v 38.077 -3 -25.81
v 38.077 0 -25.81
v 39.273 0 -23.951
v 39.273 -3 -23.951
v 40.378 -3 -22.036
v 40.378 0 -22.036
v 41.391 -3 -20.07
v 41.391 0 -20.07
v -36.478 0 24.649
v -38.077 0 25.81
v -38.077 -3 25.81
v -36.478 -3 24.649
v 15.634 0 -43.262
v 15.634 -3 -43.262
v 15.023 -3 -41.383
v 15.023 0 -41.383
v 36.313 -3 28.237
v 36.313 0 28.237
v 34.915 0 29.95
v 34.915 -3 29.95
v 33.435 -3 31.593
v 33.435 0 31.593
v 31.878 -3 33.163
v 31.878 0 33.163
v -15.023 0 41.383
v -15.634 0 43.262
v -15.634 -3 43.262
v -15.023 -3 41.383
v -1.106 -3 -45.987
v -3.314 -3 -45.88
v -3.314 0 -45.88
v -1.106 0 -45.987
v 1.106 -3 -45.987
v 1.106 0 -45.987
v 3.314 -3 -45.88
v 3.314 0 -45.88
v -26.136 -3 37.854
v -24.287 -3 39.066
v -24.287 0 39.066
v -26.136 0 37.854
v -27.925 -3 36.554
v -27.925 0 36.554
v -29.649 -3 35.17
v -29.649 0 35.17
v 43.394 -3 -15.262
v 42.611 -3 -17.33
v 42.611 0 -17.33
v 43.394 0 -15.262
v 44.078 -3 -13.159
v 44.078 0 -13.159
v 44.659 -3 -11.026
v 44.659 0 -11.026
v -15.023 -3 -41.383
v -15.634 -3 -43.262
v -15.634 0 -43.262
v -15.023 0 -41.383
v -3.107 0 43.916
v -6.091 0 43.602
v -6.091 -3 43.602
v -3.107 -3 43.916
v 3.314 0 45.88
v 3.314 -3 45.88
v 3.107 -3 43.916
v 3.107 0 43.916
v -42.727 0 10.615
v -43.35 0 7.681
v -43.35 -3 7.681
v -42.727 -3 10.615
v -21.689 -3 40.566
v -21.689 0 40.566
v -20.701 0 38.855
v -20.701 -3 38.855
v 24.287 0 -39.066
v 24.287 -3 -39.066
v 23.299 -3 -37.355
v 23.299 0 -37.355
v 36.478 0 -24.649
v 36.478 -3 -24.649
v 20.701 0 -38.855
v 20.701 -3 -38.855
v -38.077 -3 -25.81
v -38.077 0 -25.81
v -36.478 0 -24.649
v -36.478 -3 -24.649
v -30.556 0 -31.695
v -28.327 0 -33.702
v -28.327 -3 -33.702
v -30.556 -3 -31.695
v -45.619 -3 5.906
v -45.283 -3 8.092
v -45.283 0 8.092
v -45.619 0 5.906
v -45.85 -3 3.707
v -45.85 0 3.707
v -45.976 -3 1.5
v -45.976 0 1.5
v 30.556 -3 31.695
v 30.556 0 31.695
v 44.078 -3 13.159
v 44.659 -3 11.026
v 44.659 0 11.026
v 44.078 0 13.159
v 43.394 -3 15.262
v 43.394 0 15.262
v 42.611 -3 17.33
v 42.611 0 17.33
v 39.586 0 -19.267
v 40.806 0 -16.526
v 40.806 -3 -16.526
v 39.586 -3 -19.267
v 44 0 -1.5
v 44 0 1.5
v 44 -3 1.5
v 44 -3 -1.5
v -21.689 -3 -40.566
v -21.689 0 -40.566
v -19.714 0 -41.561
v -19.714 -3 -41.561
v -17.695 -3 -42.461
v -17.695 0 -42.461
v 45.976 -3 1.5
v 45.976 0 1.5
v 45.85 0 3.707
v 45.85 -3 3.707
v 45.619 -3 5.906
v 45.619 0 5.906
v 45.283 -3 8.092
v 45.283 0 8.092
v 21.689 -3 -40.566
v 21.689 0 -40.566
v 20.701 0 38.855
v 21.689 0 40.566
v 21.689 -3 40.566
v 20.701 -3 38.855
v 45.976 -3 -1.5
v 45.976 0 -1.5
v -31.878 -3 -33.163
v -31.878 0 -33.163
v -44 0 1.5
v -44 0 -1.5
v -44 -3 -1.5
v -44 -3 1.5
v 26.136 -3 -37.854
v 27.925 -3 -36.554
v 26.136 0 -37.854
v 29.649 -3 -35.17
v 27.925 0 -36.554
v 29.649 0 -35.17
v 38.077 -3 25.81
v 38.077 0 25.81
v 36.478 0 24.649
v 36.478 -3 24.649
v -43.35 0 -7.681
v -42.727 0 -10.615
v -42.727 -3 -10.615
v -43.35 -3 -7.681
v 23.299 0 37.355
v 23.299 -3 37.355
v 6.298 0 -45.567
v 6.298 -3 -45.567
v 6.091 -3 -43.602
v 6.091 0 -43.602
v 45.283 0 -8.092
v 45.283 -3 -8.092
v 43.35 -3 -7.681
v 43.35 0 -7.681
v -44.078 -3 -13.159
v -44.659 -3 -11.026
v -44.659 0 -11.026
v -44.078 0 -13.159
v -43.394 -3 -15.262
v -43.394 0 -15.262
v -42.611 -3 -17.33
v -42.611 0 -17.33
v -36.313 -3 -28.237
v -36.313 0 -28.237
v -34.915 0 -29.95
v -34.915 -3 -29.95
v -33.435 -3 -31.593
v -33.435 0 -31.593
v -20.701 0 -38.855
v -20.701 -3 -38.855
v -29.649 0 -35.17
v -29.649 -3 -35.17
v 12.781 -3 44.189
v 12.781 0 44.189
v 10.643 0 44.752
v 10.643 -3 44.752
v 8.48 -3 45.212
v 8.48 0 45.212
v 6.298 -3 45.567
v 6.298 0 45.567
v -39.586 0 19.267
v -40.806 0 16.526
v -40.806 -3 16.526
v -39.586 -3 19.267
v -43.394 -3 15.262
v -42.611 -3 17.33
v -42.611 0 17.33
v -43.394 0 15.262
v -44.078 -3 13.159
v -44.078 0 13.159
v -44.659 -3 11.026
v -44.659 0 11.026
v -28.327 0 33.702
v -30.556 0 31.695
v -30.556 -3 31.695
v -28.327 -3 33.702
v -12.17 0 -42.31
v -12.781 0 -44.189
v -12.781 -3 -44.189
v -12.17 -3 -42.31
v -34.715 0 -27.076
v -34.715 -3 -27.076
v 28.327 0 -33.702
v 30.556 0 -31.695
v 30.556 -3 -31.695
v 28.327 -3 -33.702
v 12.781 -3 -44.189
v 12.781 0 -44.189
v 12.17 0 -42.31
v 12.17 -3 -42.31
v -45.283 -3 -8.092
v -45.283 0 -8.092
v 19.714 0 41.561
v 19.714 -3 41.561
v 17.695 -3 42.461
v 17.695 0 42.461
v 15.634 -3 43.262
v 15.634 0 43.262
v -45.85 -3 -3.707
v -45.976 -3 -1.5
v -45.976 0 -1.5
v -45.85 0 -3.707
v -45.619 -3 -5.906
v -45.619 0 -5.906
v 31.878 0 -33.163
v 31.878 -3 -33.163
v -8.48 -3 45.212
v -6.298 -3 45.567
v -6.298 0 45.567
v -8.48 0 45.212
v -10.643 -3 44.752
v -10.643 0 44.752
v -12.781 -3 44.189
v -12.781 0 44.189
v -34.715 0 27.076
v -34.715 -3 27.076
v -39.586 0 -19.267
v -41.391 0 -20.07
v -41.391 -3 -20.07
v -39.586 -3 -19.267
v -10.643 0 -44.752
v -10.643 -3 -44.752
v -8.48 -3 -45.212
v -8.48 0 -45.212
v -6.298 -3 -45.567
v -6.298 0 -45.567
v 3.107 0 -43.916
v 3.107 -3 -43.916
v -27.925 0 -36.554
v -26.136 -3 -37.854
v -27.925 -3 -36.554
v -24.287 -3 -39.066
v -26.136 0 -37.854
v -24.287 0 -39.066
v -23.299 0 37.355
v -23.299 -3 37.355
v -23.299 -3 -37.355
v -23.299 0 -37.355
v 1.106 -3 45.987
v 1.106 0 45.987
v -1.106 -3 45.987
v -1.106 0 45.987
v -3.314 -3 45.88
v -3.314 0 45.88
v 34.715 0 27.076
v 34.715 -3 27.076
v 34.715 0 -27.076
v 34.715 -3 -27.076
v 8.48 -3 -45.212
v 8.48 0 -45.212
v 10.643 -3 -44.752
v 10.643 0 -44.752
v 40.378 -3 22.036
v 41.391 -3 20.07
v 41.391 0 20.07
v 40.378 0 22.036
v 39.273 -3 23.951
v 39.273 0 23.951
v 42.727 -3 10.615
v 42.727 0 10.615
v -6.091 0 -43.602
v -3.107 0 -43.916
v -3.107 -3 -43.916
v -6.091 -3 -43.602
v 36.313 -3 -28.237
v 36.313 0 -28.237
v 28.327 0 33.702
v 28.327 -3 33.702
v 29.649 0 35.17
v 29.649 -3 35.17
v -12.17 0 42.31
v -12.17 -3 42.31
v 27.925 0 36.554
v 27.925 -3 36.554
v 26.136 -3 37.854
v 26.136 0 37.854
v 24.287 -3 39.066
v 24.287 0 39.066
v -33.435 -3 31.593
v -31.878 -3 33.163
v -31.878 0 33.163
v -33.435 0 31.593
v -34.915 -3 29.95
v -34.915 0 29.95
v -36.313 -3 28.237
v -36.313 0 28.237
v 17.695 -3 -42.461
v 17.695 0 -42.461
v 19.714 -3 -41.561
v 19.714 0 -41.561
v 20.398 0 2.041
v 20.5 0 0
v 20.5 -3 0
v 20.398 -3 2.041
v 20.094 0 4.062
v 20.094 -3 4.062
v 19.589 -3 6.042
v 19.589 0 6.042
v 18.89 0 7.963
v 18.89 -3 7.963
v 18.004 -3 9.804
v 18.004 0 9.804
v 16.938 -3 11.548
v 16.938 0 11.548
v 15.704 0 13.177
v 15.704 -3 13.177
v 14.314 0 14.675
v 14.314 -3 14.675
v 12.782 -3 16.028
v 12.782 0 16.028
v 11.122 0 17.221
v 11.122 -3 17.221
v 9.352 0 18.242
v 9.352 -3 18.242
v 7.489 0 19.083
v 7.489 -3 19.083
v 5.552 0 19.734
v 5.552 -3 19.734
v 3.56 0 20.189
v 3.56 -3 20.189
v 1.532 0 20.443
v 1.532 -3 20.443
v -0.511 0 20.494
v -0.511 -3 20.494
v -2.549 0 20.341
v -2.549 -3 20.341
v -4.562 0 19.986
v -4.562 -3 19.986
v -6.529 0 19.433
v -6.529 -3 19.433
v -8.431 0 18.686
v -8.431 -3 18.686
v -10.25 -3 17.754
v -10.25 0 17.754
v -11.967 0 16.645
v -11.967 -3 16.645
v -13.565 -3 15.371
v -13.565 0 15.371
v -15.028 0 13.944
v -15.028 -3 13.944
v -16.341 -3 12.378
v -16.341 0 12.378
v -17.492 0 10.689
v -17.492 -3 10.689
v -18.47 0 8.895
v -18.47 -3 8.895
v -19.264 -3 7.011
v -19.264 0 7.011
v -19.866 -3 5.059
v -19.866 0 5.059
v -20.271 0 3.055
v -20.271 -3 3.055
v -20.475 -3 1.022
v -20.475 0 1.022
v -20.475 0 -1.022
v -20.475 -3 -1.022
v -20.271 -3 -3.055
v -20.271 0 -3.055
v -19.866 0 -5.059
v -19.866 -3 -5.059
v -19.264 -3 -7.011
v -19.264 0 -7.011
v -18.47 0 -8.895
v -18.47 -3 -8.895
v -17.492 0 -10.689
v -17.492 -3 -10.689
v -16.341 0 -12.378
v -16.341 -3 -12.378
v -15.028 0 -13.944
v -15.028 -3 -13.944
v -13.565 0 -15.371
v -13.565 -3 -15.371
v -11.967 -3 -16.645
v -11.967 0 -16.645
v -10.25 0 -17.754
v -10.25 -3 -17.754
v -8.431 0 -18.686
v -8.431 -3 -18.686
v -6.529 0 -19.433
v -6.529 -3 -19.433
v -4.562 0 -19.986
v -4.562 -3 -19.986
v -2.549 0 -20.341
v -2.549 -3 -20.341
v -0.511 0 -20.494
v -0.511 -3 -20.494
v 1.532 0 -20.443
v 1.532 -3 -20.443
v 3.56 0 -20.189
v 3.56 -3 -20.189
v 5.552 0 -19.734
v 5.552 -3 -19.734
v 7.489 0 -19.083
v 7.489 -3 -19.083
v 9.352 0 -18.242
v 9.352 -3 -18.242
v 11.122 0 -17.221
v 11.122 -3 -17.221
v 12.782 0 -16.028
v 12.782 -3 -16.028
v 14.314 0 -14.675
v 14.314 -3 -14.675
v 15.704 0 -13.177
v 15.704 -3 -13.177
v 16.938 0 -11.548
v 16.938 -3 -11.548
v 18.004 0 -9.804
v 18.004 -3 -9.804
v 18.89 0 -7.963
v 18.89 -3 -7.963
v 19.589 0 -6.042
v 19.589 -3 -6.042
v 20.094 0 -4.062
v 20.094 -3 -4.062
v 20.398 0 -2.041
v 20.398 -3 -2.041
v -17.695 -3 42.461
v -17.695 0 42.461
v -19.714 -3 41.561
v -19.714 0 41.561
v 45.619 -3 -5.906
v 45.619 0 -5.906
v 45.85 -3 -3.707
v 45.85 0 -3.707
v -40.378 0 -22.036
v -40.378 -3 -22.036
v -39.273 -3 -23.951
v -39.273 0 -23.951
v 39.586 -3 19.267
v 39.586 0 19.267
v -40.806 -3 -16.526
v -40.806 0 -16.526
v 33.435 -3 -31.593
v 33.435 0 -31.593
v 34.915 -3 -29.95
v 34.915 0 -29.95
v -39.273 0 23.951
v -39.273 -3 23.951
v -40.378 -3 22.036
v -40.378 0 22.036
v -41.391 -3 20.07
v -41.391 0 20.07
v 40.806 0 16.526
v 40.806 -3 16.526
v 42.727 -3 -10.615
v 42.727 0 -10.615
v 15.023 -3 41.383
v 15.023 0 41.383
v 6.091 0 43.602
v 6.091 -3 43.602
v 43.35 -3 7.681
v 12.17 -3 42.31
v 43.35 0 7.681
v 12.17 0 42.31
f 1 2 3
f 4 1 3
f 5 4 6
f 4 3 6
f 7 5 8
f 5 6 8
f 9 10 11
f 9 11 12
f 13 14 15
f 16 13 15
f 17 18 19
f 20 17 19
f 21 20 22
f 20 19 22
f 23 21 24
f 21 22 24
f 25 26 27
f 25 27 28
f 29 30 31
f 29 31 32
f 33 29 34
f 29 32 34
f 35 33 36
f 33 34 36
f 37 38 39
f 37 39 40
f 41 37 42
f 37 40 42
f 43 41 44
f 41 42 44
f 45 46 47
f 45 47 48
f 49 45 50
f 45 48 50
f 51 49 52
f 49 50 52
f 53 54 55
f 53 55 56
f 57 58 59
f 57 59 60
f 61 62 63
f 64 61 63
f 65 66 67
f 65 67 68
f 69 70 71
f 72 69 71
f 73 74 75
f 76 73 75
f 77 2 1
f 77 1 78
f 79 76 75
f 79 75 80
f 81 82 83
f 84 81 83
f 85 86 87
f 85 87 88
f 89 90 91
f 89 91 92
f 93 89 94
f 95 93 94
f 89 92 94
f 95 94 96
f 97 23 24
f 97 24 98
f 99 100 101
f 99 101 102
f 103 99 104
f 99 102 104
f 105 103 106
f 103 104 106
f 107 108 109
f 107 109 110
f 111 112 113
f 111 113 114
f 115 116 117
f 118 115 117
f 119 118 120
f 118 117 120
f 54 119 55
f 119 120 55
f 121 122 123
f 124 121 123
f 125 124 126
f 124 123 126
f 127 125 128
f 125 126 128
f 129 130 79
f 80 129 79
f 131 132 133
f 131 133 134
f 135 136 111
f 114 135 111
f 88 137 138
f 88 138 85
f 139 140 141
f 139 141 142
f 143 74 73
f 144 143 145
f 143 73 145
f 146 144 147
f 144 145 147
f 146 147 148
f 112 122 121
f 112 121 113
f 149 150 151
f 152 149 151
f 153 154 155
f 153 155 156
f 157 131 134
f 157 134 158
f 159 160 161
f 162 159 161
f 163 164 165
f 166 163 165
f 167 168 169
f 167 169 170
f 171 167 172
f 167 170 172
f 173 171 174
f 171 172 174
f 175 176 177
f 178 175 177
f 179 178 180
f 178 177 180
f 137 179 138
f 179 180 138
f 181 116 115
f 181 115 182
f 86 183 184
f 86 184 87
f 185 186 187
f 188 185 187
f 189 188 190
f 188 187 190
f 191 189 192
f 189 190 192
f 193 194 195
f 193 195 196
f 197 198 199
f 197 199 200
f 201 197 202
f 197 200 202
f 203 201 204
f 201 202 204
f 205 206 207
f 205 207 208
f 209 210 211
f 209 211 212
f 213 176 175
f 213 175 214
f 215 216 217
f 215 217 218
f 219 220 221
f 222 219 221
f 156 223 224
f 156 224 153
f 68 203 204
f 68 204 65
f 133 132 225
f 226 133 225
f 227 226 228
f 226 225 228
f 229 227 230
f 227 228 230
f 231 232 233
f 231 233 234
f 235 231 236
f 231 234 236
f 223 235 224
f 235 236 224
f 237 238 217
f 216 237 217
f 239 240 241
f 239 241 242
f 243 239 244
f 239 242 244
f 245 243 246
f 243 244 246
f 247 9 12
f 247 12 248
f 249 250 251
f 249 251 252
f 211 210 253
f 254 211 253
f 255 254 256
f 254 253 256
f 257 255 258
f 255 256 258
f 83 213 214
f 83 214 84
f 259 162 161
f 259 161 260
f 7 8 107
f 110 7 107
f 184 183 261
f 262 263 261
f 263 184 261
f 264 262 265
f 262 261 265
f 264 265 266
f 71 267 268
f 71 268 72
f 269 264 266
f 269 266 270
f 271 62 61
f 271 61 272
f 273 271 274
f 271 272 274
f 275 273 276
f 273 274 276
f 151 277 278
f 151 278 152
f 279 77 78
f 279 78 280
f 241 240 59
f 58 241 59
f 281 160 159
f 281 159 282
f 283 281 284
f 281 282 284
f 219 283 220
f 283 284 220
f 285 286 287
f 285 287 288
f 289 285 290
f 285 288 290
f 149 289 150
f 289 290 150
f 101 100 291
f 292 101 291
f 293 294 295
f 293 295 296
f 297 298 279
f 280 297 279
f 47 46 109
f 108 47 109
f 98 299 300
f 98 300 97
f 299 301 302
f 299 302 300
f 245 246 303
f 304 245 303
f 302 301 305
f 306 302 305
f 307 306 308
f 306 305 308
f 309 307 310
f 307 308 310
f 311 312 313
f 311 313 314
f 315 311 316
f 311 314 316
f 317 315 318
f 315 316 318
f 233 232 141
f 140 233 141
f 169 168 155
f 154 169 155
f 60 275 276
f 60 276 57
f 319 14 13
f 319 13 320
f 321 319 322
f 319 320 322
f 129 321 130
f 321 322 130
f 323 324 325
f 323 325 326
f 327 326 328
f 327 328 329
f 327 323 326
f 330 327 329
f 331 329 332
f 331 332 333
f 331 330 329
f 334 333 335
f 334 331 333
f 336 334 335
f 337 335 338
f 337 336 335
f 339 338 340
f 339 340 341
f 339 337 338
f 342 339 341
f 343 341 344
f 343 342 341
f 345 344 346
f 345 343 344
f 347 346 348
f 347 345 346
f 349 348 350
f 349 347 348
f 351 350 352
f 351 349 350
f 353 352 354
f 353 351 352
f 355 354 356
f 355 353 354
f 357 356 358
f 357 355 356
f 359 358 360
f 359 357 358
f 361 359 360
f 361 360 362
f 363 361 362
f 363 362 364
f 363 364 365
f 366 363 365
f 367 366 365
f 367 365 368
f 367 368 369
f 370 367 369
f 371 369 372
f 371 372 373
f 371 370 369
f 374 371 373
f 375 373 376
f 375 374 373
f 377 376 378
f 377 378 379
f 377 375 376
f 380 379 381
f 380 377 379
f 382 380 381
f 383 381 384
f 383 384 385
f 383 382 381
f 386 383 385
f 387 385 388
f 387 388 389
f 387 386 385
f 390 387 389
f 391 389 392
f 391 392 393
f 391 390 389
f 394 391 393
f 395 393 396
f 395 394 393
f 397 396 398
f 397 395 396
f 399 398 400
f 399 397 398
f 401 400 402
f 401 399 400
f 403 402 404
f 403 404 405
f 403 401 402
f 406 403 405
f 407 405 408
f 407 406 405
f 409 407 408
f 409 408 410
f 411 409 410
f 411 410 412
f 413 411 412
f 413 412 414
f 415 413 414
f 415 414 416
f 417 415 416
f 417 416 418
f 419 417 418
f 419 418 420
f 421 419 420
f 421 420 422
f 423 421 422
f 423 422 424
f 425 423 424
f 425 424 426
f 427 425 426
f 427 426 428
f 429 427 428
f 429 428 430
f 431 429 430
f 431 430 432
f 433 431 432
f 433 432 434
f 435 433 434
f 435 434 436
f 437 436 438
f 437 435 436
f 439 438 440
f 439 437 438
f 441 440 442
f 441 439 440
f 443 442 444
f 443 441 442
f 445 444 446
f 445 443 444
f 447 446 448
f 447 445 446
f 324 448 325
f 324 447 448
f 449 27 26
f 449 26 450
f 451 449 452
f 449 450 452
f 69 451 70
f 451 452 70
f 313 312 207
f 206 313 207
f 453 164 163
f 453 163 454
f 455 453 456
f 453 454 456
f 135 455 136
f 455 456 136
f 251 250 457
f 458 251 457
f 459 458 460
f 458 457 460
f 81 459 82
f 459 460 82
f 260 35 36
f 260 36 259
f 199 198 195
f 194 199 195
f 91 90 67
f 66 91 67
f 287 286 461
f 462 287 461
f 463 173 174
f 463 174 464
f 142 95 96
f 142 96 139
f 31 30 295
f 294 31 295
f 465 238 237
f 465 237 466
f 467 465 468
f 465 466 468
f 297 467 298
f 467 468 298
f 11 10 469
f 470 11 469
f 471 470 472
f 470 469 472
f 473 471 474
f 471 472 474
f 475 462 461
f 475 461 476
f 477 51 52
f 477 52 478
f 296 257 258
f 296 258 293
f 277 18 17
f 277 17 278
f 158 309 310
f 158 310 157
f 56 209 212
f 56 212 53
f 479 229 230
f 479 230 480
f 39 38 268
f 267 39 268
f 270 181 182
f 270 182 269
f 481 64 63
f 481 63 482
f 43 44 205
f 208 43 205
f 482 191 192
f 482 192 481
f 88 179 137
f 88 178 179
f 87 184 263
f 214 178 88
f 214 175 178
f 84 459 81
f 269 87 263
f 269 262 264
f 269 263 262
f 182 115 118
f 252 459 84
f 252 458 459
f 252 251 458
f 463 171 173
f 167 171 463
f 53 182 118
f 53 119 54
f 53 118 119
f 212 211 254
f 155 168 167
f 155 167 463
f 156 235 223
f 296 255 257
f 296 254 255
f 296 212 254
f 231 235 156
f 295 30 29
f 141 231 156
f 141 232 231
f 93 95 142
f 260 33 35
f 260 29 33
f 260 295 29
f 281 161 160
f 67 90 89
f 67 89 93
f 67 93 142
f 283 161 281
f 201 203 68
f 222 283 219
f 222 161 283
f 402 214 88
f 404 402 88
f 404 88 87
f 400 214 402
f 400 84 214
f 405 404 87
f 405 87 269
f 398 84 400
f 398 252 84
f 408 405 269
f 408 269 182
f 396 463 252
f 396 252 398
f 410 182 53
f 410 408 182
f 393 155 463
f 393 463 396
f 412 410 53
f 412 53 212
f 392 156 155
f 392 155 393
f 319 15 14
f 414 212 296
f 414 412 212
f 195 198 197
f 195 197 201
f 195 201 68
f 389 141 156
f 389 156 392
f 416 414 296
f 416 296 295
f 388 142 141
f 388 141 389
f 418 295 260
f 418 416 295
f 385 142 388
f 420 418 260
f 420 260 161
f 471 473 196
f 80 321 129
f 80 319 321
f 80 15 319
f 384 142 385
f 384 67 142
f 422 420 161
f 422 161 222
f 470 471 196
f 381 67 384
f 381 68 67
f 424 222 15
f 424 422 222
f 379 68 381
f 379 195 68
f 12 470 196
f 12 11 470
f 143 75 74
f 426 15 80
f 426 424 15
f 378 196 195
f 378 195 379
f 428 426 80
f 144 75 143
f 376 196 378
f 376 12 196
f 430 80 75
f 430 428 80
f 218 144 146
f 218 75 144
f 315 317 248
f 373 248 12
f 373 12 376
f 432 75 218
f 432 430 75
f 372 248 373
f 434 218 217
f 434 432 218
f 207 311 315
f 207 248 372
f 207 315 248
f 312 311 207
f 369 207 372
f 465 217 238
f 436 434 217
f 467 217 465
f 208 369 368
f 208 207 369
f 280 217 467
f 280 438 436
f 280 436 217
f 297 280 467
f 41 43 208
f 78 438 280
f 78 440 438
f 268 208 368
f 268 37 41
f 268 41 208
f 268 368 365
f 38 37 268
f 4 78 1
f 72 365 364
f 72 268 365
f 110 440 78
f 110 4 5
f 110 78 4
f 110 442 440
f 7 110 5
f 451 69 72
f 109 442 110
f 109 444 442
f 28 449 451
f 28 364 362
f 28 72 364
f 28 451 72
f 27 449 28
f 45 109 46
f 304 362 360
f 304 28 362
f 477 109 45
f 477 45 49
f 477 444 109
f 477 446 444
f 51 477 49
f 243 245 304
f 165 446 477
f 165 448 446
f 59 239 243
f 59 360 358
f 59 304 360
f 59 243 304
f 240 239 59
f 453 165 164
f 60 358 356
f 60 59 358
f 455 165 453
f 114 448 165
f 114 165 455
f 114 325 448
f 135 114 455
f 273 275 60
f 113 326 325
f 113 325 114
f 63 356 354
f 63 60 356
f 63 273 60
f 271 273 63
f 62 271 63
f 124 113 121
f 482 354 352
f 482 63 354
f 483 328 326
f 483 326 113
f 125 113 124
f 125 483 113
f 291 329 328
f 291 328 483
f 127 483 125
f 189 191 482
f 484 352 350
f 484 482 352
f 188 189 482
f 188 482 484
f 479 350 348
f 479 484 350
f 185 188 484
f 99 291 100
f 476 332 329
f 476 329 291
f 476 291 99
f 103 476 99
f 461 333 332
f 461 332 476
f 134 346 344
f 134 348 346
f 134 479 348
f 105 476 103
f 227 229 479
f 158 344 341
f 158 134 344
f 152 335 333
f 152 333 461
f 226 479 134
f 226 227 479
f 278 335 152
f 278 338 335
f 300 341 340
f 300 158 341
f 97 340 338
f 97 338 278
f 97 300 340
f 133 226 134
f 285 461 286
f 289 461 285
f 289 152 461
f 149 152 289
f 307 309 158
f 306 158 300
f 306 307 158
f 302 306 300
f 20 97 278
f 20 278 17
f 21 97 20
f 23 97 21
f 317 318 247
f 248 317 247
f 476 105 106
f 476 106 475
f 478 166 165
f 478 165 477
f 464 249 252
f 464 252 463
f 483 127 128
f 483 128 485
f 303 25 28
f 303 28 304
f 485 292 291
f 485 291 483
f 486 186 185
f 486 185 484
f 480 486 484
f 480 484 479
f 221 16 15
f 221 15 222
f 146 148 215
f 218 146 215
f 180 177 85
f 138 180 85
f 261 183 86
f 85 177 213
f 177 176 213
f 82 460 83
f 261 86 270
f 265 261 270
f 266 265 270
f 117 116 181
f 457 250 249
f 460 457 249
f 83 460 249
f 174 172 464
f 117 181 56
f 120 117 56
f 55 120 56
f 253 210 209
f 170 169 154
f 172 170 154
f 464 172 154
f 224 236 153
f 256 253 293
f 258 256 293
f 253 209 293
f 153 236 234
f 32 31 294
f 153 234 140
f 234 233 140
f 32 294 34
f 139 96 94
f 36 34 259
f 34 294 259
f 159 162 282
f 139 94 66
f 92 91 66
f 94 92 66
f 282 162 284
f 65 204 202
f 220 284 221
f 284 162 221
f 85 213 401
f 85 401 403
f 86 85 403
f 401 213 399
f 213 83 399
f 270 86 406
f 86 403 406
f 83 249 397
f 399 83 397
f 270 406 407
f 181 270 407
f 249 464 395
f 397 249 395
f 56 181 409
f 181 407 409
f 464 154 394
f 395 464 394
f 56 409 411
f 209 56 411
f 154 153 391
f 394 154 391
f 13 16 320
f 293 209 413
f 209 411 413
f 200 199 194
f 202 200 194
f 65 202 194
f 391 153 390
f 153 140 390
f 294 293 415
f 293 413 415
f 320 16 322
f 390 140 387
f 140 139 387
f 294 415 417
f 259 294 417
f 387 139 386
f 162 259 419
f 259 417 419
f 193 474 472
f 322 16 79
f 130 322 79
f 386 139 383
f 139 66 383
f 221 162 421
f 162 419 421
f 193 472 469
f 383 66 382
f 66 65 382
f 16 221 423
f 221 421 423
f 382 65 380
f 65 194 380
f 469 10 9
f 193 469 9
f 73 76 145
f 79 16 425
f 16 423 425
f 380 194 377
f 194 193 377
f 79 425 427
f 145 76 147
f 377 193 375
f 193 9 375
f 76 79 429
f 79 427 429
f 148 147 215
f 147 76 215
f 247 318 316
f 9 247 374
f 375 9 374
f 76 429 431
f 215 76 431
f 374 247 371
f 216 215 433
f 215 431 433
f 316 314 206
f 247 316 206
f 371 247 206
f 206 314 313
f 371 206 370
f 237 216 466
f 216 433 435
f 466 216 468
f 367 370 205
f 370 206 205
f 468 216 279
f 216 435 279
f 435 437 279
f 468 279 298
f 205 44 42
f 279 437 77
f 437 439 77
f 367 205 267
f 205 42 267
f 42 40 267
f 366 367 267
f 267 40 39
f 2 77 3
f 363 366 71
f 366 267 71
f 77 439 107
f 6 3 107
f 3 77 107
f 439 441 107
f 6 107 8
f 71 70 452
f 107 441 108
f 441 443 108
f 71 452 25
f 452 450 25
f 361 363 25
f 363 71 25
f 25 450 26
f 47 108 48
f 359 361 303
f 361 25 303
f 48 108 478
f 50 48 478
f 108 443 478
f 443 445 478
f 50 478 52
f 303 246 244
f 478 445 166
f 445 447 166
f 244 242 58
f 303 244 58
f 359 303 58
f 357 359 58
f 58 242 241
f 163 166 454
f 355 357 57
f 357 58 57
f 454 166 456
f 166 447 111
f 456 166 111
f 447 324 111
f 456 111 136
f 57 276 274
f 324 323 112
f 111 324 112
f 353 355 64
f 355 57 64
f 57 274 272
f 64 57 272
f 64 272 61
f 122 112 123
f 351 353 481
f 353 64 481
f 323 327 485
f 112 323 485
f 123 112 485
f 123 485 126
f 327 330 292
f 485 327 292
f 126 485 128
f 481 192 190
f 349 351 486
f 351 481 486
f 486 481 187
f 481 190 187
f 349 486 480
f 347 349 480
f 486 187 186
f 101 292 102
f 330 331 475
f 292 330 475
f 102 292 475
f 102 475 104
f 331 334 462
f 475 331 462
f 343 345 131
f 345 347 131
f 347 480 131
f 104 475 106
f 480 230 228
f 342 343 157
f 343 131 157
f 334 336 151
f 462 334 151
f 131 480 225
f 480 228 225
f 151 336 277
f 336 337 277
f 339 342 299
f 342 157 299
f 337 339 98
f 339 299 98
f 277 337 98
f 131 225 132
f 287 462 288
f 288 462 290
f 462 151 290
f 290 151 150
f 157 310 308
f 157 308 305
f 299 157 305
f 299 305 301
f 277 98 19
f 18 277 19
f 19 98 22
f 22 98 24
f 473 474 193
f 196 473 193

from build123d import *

# Parameters (mm, degrees)
F0_R            = 46
F0_R_2          = 20.5
F1_DEPTH        = 3
F2_W            = 2
F2_H            = 3
F3_DEPTH        = 3
F3_COPIES_COUNT = 30


# Not quite as in the source:
# - a pattern or mirror of a feature is missing from the dataset's text; its kind, count and spacing are read off the source's solid


with BuildPart() as f1:
    # F0 (on Front) → F1 (new body)
    with BuildSketch(Plane.XZ):
        Circle(F0_R)
        Circle(F0_R_2, mode=Mode.SUBTRACT)
    extrude(amount=F1_DEPTH)

    # F2 (on Front) → F3 (cut)
    with BuildSketch(Plane.XZ):
        with Locations((-45, 0)):
            Rectangle(F2_W, F2_H)
    f3 = extrude(amount=F3_DEPTH, mode=Mode.SUBTRACT)

    # F3_copies: F3 ×30 about axis
    f3_copies_axis = Axis((0, 0, 0), (0, 1, 0))
    for i in range(1, F3_COPIES_COUNT):
        add(f3.rotate(f3_copies_axis, i * 360 / F3_COPIES_COUNT), mode=Mode.SUBTRACT)


solid = f1.part
